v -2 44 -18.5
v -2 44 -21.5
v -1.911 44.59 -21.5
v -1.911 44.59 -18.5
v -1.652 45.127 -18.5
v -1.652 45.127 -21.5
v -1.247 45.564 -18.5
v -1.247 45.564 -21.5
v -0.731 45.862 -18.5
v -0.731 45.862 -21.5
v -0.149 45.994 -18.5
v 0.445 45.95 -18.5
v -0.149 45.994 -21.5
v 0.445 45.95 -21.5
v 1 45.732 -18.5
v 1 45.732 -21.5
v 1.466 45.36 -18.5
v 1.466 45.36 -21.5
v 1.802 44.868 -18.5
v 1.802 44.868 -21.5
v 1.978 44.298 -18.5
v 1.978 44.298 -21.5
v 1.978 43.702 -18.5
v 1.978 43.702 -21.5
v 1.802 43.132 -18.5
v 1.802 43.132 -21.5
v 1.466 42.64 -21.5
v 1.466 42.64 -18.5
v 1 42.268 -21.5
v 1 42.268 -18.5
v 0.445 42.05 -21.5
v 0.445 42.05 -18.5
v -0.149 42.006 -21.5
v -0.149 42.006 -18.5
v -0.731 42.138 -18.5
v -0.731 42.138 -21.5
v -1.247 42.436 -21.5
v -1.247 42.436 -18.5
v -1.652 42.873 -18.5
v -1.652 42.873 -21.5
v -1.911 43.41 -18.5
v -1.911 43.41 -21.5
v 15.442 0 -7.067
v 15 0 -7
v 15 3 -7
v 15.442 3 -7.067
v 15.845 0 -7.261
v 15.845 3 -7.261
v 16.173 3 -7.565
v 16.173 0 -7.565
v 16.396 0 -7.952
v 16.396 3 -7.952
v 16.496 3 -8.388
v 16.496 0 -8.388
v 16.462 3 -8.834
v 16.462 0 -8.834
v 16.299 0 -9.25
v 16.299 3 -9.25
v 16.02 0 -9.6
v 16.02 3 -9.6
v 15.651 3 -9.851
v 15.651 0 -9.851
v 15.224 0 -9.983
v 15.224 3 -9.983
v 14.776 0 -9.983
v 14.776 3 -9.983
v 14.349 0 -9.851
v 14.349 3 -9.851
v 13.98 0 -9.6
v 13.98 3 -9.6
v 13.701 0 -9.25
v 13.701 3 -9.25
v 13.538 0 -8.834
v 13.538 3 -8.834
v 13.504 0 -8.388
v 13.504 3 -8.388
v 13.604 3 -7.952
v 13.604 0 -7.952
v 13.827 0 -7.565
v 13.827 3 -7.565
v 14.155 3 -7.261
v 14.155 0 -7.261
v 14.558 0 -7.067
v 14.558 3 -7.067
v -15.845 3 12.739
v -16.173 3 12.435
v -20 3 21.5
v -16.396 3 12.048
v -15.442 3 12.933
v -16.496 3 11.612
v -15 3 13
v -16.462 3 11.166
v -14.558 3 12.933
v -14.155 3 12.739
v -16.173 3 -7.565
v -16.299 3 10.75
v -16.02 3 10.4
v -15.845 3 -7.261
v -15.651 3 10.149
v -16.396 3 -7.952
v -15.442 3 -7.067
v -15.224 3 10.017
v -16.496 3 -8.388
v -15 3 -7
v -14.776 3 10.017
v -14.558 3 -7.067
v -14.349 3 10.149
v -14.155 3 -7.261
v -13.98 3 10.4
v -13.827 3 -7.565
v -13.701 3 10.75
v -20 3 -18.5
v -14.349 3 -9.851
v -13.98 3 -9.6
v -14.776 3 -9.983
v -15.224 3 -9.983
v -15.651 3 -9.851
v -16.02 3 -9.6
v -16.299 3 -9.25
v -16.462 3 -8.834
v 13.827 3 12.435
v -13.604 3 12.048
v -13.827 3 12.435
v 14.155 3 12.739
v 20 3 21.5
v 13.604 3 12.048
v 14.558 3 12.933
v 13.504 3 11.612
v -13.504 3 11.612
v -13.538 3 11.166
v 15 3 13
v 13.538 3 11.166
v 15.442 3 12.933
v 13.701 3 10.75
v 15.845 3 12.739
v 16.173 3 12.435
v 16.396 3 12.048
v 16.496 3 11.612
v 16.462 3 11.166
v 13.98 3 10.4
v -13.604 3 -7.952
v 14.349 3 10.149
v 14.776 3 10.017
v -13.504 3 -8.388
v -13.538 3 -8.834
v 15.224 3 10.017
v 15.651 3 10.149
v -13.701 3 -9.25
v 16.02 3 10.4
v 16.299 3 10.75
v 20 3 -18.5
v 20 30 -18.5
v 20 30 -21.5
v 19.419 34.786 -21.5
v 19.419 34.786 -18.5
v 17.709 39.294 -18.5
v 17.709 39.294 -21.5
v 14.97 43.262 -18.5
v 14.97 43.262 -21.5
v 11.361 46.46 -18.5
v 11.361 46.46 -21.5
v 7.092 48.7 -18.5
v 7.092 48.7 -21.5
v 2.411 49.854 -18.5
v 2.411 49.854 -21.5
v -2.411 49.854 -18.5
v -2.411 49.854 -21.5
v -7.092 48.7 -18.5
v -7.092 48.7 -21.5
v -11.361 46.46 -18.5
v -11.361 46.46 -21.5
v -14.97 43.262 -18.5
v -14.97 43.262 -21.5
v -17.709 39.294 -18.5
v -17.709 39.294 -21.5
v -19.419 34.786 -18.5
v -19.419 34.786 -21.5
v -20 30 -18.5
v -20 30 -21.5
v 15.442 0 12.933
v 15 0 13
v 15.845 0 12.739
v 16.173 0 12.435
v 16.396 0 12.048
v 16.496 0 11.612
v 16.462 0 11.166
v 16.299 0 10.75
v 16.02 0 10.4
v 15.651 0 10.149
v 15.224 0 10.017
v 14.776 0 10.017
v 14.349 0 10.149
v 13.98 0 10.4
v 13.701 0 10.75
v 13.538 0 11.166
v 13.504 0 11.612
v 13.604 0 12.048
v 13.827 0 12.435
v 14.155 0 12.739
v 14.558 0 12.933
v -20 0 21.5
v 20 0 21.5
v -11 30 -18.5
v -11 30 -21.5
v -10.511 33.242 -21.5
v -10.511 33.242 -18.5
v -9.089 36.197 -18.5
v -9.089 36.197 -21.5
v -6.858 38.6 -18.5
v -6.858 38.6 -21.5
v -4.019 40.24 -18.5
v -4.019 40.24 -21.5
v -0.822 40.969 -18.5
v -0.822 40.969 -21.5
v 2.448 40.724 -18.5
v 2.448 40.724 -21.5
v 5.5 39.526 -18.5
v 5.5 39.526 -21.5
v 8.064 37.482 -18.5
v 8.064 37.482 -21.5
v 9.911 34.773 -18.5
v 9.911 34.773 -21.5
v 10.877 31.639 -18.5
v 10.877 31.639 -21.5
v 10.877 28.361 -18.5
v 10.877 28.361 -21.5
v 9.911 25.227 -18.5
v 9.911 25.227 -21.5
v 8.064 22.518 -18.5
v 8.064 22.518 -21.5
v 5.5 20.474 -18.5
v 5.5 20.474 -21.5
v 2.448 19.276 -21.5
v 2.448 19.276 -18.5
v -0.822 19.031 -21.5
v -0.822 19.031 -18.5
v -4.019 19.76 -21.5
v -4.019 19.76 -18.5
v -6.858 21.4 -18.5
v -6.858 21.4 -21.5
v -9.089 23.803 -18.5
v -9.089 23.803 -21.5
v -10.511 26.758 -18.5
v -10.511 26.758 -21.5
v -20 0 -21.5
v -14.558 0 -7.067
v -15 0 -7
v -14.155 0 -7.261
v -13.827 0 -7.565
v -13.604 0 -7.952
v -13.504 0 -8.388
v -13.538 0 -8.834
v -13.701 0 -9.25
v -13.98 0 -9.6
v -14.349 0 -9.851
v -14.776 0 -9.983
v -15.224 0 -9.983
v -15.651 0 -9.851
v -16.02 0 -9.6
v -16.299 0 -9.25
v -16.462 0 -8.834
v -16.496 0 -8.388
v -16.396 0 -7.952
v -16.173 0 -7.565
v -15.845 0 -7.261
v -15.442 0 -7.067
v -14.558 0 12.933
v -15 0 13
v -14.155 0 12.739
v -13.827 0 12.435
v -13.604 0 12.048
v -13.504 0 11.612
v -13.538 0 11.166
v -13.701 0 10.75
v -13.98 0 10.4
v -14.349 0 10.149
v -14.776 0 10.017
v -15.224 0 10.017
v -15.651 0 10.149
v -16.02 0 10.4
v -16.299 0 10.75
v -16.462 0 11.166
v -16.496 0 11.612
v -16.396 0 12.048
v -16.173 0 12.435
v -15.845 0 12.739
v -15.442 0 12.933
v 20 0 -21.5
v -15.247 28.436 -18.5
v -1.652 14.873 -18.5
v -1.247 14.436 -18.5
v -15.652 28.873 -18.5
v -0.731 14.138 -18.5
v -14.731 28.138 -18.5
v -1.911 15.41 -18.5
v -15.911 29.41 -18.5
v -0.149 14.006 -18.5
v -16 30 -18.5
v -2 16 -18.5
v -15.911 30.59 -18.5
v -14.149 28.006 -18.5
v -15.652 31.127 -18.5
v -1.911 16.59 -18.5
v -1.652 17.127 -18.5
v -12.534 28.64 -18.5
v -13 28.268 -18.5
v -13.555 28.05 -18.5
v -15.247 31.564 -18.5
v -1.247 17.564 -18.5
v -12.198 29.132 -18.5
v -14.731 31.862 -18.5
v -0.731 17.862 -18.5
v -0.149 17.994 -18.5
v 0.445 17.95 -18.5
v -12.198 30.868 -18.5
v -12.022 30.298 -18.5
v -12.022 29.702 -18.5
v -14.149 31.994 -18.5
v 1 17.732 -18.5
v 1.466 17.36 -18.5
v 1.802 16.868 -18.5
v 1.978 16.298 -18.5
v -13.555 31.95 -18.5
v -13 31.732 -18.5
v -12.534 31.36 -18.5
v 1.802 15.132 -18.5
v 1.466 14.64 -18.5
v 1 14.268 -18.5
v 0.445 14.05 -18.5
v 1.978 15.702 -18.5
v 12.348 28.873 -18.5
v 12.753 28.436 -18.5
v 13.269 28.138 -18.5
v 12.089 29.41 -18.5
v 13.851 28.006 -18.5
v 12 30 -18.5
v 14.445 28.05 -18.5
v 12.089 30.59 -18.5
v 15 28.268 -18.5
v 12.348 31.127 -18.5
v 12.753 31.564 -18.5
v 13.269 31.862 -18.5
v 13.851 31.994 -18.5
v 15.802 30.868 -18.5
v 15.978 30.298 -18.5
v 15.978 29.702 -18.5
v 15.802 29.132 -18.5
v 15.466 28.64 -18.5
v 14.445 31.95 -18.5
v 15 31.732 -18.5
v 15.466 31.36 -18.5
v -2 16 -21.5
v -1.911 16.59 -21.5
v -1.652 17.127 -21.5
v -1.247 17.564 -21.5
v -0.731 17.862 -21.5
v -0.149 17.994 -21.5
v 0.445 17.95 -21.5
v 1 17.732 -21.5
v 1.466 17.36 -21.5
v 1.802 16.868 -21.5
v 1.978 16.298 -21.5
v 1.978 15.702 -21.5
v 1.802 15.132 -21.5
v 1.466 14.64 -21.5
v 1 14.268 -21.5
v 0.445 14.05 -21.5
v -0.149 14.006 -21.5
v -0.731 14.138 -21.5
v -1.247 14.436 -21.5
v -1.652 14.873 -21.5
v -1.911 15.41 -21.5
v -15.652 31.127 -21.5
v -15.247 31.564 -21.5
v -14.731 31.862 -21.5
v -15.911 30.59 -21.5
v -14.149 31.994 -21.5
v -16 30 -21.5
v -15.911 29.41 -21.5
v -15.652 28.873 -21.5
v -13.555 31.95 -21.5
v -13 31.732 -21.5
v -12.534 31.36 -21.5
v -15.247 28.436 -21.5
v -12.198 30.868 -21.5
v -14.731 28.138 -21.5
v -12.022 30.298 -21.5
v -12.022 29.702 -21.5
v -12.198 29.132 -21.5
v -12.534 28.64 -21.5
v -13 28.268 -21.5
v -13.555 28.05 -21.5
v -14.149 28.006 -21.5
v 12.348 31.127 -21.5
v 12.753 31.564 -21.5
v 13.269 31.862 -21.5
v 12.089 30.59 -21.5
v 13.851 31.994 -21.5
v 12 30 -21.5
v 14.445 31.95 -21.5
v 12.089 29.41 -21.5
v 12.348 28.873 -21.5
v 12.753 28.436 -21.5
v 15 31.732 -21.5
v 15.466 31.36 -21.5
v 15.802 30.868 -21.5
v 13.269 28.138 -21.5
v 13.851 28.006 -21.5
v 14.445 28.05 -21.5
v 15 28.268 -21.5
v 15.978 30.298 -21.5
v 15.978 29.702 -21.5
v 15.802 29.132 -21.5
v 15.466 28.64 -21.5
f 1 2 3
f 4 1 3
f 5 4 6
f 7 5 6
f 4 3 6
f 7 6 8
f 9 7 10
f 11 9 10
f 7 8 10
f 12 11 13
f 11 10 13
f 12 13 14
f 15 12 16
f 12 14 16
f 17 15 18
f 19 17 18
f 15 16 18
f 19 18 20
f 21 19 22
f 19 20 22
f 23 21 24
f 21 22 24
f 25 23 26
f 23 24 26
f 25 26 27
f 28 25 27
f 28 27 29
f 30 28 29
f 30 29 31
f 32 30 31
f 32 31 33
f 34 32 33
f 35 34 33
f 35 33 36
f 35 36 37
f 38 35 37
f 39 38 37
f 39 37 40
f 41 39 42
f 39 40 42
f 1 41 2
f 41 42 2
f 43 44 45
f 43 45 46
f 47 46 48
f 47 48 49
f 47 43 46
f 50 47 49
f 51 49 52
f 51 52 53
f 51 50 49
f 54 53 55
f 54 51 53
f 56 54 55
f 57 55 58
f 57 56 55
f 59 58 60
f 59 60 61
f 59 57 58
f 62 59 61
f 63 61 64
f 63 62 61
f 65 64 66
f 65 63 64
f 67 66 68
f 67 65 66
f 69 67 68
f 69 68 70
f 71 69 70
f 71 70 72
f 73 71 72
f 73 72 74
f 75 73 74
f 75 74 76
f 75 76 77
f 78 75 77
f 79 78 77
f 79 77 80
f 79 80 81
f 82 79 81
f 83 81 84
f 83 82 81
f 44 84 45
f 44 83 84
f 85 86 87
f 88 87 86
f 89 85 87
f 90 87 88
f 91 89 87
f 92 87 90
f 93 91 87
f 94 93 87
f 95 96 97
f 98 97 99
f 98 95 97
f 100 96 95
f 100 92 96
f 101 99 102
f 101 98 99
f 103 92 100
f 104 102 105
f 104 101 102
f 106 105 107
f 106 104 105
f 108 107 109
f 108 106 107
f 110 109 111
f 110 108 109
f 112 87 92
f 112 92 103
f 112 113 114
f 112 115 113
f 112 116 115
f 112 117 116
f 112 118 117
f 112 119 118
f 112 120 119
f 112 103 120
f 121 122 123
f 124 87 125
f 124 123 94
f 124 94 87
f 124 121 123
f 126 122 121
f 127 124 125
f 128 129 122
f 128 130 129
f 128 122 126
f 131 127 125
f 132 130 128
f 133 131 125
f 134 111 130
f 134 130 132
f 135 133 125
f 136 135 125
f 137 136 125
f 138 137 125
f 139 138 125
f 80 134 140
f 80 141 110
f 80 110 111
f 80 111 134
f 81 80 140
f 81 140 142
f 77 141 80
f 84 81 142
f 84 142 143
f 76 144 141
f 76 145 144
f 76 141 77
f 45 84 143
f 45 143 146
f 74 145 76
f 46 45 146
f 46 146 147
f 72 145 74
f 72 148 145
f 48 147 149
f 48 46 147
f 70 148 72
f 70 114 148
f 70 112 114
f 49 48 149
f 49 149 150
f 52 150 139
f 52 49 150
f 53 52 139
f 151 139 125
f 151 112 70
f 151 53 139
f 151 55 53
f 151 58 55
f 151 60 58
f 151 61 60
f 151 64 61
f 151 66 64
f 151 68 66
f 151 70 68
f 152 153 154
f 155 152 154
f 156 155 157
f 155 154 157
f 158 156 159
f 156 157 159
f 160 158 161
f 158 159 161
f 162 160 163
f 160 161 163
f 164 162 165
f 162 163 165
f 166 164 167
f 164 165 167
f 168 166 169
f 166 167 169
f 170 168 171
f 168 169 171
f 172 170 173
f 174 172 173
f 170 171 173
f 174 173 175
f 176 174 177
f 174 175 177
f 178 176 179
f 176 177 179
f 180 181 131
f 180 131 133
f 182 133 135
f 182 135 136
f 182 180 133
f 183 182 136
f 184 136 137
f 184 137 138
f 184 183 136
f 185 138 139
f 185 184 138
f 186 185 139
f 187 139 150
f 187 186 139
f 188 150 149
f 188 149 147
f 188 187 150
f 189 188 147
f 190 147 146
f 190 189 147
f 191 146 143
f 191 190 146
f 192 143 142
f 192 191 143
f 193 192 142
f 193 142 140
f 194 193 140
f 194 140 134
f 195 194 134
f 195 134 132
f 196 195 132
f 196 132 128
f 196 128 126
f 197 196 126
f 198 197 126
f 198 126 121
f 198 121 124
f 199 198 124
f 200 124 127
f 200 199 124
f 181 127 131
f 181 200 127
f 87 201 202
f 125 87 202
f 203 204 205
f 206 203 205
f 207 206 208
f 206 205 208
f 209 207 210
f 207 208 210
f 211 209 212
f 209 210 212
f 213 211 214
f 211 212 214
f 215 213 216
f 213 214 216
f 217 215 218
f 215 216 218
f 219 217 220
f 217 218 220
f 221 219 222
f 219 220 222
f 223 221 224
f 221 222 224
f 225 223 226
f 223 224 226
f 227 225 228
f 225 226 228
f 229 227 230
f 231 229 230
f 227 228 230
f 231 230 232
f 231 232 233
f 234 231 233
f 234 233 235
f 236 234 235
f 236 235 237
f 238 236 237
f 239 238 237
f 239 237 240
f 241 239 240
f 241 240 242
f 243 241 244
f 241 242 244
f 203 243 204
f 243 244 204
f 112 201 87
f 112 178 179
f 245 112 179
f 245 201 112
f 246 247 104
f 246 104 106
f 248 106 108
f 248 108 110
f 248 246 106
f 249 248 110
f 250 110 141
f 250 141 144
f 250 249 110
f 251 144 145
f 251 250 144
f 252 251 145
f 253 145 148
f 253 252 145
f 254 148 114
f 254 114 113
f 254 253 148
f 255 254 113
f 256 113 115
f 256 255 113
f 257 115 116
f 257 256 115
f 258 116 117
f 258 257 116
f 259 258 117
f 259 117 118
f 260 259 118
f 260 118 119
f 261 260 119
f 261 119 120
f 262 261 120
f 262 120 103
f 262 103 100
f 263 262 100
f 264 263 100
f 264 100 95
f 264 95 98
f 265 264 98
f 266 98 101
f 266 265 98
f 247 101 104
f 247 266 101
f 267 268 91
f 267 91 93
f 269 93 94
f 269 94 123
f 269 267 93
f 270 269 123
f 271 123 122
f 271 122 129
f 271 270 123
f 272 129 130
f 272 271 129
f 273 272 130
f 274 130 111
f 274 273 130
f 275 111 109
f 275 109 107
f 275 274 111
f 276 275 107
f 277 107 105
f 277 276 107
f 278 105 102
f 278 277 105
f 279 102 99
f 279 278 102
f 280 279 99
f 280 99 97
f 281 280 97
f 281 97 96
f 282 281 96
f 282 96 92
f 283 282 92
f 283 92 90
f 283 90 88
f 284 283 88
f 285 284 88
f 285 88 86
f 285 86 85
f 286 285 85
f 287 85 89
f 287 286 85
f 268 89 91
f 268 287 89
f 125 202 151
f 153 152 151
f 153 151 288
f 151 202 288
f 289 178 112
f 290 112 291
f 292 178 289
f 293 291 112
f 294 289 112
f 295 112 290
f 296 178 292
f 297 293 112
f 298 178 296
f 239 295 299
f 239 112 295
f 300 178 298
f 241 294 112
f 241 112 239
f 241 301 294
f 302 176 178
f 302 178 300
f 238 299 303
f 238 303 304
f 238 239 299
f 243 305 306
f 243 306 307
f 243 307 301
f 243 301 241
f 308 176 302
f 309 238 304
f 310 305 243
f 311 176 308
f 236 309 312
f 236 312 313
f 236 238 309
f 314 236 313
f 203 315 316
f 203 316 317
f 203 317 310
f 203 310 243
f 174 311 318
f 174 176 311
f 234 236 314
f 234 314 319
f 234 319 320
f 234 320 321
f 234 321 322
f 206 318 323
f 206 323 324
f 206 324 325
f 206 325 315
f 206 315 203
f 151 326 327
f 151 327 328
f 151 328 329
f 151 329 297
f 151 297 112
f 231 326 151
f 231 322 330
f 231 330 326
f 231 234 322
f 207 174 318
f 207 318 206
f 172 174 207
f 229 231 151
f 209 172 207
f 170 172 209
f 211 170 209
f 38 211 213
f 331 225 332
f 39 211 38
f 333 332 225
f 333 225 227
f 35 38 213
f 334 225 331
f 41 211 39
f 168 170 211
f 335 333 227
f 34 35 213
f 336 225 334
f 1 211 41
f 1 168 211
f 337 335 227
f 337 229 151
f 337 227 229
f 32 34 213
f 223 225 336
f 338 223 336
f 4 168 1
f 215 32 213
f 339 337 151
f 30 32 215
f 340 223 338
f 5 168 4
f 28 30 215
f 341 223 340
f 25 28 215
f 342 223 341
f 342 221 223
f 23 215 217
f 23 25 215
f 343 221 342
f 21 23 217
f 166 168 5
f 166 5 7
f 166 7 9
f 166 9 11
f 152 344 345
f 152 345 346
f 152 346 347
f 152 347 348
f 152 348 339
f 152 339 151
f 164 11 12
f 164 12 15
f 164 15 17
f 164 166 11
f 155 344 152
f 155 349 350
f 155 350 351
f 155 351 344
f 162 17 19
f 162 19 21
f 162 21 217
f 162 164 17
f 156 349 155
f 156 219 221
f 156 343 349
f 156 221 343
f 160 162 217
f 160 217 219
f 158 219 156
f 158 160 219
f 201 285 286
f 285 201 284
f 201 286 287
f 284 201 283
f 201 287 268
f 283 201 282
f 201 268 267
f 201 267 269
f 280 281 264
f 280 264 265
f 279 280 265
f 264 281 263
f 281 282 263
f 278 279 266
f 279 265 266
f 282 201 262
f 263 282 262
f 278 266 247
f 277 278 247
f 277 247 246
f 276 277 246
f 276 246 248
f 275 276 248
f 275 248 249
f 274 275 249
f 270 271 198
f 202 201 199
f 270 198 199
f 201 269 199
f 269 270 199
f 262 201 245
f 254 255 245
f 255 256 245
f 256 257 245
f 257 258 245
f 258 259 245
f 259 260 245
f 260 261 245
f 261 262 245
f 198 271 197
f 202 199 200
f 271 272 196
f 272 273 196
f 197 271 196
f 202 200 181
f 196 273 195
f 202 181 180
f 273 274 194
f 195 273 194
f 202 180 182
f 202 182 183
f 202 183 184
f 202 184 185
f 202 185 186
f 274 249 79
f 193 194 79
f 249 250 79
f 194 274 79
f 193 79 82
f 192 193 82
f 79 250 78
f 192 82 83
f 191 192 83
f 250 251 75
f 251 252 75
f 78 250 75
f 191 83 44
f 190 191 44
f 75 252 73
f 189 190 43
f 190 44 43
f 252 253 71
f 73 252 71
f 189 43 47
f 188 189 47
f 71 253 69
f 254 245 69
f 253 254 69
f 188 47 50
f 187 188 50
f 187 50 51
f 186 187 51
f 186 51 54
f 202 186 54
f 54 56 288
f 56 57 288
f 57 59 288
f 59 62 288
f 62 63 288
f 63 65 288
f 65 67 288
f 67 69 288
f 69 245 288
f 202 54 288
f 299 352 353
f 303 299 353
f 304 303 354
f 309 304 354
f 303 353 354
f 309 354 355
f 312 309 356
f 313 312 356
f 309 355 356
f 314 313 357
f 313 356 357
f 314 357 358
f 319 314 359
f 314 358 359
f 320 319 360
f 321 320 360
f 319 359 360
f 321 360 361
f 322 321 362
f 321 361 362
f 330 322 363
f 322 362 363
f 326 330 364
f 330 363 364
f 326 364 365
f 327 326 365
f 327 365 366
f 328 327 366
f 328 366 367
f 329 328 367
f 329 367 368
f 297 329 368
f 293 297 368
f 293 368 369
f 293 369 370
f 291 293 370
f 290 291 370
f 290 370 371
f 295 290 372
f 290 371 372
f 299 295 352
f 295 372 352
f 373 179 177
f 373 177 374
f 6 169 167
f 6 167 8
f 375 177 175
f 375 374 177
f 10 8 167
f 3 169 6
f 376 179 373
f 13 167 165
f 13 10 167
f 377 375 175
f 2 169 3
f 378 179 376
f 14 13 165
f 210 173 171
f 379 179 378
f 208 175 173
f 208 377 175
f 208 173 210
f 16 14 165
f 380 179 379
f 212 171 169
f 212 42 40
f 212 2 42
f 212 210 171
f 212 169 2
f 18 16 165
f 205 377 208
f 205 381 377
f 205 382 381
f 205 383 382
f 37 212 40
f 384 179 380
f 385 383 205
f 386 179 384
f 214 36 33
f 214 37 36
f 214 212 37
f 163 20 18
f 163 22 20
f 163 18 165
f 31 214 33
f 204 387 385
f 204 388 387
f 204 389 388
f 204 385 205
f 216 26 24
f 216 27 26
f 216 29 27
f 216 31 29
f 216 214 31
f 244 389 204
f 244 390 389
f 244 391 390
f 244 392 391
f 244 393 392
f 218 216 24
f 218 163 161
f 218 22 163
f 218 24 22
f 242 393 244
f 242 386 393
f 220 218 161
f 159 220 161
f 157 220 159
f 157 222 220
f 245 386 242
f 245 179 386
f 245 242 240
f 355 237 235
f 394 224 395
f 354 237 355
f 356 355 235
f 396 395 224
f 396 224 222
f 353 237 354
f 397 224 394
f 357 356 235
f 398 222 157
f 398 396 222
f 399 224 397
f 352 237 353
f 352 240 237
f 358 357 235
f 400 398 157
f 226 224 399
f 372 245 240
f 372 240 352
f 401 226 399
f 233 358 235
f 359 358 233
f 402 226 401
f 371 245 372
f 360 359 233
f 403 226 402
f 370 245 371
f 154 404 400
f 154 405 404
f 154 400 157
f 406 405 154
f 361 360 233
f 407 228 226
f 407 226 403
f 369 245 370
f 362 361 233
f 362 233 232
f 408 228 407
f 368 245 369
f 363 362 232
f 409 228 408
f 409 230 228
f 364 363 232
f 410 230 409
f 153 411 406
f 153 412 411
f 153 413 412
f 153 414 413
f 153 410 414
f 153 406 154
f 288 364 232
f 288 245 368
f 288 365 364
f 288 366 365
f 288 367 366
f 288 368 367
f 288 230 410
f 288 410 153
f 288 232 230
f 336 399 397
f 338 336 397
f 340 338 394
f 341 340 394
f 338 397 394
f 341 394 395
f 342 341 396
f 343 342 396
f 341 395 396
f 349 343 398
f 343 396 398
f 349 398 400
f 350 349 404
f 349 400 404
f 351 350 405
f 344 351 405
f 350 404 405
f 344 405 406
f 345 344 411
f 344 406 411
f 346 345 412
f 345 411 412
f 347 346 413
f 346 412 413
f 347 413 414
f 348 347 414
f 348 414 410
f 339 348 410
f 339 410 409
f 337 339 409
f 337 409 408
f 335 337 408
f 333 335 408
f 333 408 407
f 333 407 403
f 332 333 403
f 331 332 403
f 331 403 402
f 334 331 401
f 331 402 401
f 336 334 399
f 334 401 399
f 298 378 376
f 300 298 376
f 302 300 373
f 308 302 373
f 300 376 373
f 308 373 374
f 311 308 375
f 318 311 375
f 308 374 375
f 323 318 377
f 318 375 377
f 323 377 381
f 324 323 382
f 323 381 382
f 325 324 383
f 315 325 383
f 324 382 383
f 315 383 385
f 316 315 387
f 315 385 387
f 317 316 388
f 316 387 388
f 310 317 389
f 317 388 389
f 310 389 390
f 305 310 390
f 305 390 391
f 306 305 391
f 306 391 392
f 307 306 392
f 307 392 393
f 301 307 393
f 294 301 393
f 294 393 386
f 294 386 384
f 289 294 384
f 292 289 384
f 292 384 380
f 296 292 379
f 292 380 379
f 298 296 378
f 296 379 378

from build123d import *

# Parameters (mm, degrees)
SKETCH_1_W      = 40
SKETCH_1_H      = 43
SKETCH_1_R      = 1.5
EXTRUDE_1_DEPTH = 3
SKETCH_3_R      = 11
SKETCH_3_R_2    = 2
EXTRUDE_2_DEPTH = 3


with BuildPart() as part:
    # 草图1 → 凸台-拉伸1 (new body)
    with BuildSketch(Plane(origin=(0, 0, 0), x_dir=(1, 0, 0), z_dir=(0, 1, 0))):
        Rectangle(SKETCH_1_W, SKETCH_1_H)
        with Locations(Location((-15, -11.5, 0), (0, 0, 270))):
            Circle(SKETCH_1_R, mode=Mode.SUBTRACT)
        with Locations(Location((15, -11.5, 0), (0, 0, 270))):
            Circle(SKETCH_1_R, mode=Mode.SUBTRACT)
        with Locations(Location((15, 8.5, 0), (0, 0, 270))):
            Circle(SKETCH_1_R, mode=Mode.SUBTRACT)
        with Locations(Location((-15, 8.5, 0), (0, 0, 270))):
            Circle(SKETCH_1_R, mode=Mode.SUBTRACT)
    extrude(amount=EXTRUDE_1_DEPTH)

    # 草图3 → 凸台-拉伸2 (add)
    with BuildSketch(Plane(origin=(0, 0, -21.5), x_dir=(-1, 0, 0), z_dir=(0, 0, -1))):
        with BuildLine():
            Line((-20, 0), (-20, 30))
            ThreePointArc((-20, 30), (0, 50), (20, 30))
            Line((20, 30), (20, 0))
            Line((20, 0), (-20, 0))
        make_face()
        with Locations((0, 30)):
            Circle(SKETCH_3_R, mode=Mode.SUBTRACT)
        with Locations((0, 44)):
            Circle(SKETCH_3_R_2, mode=Mode.SUBTRACT)
        with Locations((14, 30)):
            Circle(SKETCH_3_R_2, mode=Mode.SUBTRACT)
        with Locations((0, 16)):
            Circle(SKETCH_3_R_2, mode=Mode.SUBTRACT)
        with Locations((-14, 30)):
            Circle(SKETCH_3_R_2, mode=Mode.SUBTRACT)
    extrude(amount=-EXTRUDE_2_DEPTH)


solid = part.part
